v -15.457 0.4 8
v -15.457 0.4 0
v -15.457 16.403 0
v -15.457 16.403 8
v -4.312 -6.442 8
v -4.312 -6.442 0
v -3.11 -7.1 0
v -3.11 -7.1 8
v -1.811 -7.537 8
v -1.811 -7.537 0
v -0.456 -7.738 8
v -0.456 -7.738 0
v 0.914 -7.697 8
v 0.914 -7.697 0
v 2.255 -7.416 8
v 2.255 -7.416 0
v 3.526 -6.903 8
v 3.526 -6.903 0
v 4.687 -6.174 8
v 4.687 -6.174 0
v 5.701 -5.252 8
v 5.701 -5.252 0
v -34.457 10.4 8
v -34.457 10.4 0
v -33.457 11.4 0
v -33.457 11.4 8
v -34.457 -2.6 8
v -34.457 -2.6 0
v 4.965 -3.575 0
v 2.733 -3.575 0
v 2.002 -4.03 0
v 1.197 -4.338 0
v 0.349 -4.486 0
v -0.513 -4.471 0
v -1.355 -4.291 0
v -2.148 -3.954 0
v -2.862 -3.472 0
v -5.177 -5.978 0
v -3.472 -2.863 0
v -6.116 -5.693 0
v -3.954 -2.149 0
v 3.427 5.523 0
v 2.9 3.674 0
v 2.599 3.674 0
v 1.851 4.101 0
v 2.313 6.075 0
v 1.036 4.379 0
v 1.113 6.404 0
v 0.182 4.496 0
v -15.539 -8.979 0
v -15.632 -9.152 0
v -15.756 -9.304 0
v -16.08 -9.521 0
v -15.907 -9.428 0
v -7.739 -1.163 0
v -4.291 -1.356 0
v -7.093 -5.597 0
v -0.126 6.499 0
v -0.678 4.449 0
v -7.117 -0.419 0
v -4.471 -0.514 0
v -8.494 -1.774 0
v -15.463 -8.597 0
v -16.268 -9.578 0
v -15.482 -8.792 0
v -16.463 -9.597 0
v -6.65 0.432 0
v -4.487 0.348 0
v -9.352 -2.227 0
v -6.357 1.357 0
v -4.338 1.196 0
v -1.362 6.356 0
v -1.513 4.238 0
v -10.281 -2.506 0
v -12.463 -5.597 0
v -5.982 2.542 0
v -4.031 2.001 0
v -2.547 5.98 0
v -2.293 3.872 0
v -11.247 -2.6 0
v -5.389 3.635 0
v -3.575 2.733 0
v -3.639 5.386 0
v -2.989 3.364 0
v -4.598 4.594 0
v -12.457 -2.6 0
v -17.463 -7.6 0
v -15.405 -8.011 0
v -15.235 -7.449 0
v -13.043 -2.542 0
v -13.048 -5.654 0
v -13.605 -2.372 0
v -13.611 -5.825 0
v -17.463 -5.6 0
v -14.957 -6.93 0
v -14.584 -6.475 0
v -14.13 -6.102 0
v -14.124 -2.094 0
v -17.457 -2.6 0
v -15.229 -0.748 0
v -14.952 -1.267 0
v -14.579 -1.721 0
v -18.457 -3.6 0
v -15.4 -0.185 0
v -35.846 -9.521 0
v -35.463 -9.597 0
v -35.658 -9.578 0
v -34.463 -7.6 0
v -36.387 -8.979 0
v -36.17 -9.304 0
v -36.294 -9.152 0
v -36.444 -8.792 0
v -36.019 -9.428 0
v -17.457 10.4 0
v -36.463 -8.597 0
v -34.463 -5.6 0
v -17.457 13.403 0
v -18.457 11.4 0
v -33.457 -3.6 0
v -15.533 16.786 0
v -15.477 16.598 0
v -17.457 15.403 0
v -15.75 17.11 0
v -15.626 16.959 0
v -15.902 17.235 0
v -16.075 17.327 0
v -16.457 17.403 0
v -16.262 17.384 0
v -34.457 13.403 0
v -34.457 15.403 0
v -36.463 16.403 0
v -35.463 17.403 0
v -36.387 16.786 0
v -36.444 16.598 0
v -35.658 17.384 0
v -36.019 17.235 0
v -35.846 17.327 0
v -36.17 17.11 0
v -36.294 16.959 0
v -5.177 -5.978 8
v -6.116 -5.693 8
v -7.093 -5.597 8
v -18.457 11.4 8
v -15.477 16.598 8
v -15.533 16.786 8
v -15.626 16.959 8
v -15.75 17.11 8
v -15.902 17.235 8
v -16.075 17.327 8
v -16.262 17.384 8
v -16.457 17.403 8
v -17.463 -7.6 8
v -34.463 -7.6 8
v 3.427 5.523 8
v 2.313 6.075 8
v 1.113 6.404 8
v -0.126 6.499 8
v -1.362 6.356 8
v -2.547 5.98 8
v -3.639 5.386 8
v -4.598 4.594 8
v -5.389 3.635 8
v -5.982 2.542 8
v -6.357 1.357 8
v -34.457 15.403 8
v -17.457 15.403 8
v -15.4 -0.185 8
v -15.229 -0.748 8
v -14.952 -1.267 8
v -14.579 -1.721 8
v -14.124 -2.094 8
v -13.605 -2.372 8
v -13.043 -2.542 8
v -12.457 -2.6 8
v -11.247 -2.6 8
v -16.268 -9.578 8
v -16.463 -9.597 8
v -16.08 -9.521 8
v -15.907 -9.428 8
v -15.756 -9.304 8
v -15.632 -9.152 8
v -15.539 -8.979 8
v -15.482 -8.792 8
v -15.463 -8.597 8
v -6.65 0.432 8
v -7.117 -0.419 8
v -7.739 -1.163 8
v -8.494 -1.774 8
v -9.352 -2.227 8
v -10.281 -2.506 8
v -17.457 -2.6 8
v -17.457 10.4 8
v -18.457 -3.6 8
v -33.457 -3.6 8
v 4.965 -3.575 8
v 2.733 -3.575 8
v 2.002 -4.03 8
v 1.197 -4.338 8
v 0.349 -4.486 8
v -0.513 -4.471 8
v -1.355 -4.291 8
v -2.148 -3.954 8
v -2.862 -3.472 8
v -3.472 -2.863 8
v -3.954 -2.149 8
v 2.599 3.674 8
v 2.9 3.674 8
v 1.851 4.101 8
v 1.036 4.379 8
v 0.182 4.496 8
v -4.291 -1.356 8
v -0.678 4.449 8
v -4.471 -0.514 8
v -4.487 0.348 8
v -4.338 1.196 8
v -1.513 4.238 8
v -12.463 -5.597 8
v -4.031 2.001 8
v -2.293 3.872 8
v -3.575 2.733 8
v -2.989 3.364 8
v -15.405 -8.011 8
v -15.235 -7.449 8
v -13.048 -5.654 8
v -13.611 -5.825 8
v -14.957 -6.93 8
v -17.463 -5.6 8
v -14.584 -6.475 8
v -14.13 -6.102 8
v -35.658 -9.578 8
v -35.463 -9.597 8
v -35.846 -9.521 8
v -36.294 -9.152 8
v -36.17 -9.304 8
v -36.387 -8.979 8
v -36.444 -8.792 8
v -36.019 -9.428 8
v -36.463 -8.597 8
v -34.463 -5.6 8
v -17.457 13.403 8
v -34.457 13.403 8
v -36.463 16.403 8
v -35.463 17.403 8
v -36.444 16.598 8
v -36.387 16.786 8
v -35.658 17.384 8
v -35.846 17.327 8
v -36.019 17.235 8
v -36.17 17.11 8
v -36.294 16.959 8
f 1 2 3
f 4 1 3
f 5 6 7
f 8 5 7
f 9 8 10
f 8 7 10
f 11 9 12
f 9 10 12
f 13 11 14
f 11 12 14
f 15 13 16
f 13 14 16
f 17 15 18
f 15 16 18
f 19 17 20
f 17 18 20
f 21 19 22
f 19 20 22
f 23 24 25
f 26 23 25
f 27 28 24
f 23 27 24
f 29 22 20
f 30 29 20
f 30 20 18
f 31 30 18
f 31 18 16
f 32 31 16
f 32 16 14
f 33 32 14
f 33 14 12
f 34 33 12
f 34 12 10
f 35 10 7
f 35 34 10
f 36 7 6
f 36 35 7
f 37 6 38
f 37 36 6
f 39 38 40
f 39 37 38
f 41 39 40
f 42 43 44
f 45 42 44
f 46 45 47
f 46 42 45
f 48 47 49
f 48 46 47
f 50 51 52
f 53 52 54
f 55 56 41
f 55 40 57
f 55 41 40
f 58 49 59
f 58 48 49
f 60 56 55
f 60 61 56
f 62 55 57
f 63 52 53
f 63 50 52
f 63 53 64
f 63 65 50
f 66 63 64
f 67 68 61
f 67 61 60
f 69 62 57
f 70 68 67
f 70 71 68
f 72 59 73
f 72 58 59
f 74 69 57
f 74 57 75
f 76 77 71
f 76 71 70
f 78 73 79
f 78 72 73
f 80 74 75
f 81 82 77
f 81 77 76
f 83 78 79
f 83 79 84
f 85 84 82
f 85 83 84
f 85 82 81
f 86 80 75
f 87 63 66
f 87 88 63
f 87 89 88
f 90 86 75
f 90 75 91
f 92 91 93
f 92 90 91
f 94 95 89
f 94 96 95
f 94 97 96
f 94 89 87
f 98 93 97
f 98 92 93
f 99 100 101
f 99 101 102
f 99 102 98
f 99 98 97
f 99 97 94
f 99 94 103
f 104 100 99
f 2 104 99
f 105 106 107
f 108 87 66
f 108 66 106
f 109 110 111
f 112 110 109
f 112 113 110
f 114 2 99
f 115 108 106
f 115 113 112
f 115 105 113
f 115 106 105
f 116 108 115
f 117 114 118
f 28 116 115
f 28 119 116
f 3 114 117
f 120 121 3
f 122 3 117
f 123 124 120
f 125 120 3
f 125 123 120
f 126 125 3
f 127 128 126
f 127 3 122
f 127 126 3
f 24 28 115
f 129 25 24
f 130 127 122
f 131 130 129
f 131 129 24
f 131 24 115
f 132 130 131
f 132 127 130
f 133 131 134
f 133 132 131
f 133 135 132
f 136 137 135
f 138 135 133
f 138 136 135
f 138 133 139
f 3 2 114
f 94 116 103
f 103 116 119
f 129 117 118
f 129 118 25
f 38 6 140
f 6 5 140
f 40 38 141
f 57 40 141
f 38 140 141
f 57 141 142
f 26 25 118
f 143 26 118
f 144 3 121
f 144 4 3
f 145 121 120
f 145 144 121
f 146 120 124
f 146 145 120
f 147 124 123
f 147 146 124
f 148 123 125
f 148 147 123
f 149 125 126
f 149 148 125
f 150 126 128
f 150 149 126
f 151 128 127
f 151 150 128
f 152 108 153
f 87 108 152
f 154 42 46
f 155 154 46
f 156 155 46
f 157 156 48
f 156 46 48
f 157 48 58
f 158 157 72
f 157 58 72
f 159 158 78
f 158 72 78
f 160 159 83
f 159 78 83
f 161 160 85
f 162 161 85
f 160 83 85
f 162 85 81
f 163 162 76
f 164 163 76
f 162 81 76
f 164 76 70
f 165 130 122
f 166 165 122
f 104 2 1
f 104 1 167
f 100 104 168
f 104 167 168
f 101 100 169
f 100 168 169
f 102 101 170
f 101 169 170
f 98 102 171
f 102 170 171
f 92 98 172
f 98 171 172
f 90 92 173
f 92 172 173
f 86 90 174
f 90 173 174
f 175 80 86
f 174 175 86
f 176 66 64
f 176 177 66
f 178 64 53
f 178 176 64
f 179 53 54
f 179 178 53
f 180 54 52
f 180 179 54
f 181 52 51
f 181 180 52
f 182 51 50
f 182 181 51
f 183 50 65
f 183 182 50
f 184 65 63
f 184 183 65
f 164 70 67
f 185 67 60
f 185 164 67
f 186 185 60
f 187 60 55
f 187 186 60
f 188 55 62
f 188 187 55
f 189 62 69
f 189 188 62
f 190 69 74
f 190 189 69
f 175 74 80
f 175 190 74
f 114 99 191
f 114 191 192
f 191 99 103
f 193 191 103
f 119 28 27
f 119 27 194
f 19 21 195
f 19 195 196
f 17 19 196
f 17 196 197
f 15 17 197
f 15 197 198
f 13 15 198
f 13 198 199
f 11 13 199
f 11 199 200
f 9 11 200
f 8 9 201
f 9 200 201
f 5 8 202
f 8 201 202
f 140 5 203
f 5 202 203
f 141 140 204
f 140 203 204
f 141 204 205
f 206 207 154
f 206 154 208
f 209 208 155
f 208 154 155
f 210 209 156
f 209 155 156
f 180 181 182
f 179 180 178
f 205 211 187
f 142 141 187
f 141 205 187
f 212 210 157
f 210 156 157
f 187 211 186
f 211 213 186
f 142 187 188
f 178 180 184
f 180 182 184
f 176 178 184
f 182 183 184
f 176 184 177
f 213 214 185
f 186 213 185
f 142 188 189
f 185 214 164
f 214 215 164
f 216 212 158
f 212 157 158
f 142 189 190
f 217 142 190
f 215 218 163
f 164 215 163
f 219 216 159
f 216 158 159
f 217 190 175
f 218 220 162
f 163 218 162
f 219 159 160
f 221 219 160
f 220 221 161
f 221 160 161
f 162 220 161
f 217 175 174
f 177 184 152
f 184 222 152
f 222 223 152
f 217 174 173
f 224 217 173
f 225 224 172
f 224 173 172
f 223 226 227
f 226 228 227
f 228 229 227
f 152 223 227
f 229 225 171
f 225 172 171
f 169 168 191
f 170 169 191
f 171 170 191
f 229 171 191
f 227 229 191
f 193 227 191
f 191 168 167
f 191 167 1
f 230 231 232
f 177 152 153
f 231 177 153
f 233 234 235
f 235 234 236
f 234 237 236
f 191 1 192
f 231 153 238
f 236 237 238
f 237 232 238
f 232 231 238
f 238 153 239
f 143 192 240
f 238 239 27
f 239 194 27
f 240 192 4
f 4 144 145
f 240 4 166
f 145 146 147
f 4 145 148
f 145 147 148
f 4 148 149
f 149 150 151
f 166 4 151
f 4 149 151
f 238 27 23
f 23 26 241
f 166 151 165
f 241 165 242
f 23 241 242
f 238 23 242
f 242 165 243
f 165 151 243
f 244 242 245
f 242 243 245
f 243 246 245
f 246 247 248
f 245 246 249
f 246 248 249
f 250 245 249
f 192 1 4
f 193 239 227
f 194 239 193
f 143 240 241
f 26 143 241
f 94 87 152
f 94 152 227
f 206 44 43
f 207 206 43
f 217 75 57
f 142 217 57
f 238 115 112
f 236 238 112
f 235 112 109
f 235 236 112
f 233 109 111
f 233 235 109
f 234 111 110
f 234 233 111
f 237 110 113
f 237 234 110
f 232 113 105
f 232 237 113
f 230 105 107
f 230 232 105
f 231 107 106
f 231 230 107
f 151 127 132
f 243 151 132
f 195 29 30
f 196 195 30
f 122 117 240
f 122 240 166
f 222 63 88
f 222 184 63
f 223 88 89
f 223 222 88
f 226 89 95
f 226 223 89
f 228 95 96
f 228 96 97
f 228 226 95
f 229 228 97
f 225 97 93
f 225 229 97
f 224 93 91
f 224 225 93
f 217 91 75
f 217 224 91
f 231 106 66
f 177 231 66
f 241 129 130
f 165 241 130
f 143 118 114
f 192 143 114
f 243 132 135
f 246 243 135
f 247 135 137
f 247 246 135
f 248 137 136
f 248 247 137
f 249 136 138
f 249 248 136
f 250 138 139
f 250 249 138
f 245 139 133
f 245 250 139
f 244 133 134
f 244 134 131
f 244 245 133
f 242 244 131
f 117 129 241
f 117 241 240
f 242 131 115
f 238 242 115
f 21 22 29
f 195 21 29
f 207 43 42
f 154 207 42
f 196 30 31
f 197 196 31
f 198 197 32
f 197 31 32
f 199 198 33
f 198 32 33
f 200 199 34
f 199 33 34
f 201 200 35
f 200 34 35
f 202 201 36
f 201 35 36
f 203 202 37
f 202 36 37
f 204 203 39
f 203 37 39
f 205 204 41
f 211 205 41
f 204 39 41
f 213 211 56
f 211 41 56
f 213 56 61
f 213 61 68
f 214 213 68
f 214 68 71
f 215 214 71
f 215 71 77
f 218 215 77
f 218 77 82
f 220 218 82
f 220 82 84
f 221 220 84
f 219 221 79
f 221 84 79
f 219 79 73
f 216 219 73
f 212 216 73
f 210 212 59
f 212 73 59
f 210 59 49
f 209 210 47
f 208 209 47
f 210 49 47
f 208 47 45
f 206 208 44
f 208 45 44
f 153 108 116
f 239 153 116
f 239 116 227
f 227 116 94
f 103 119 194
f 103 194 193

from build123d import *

# Parameters (mm, degrees)
F0_W        = 17
F0_H        = 2
F0_H_2      = 15
F1_DEPTH    = 8
F2_R        = 5
F3_T1_DEPTH = 8
F3_T3_DEPTH = 18.3525106995
F3_T5_DEPTH = 21.4805273161
F4_R        = 1
F5_R        = 2.99999


# Not quite as in the source:
# - a fillet or chamfer that OpenCascade refuses, or shapes differently, is made with other operations: its cross-section is extruded or revolved along the edge and cut away or added
# - a fillet or chamfer is up to 0.001 mm smaller than in the source, because OpenCascade refuses the exact size


with BuildPart() as f1:
    # F0 (on Top) → F1 (new body)
    with BuildSketch(Plane.XY):
        with BuildLine():
            ThreePointArc((2.7332443879, -3.5748251868), (-4.4992296638, -0.0832612306), (2.5991092476, 3.6735039294))
            Line((2.5991092476, 3.6735039294), (5.3624032747, 3.6735039294))
            ThreePointArc((5.3624032747, 3.6735039294), (-3.1508257353, 5.6852701946), (-5.9573484034, -2.6))
            Line((-5.9573484034, -2.6), (-15.4573484034, -2.6))
            Line((-15.4573484034, -2.6), (-15.4573484034, 13.4))
            Line((-15.4573484034, 13.4), (-15.4573484034, 17.4032363431))
            Line((-15.4573484034, 17.4032363431), (-36.4629774356, 17.4032363431))
            Line((-36.4629774356, 17.4032363431), (-36.4629774356, 11.4032363431))
            Line((-36.4629774356, 11.4032363431), (-36.4629774356, -9.5967636569))
            Line((-36.4629774356, -9.5967636569), (-15.4629774356, -9.5967636569))
            Line((-15.4629774356, -9.5967636569), (-15.4629774356, -5.5967636569))
            Line((-15.4629774356, -5.5967636569), (-5.3631004506, -5.5967636569))
            ThreePointArc((-5.3631004506, -5.5967636569), (1.2632530504, -7.6479279289), (6.8780254985, -3.5748251868))
            Line((6.8780254985, -3.5748251868), (2.7332443879, -3.5748251868))
        make_face()
        with Locations((-25.9629774356, -6.6)):
            Rectangle(F0_W, F0_H, mode=Mode.SUBTRACT)
        with Locations((-25.9573484034, 3.9)):
            Rectangle(F0_W, F0_H_2, mode=Mode.SUBTRACT)
        with Locations((-25.9573484034, 14.4032363431)):
            Rectangle(F0_W, F0_H, mode=Mode.SUBTRACT)
    extrude(amount=F1_DEPTH)

    # F2
    f2_edges = [f1.edges().sort_by_distance(p)[0] for p in [
        (-5.957348, -2.6, 4),
        (-5.3631, -5.596764, 4),
    ]]
    fillet(f2_edges, radius=F2_R)

    # F3: chamfer of 1 on 6 edges, made by hand

    # F3_s2 → F3_t1 (join)
    with BuildSketch(Plane.XY):
        Polygon((-34.4573484034, -2.6), (-33.4573484034, -3.6), (-34.4573484034, -3.6), align=None)
        Polygon((-34.4573484034, 10.4), (-33.4573484034, 11.4), (-34.4573484034, 11.4), align=None)
        Polygon((-18.4573484034, 11.4), (-17.4573484034, 10.4), (-17.4573484034, 11.4), align=None)
        Polygon((-17.4573484034, -2.6), (-18.4573484034, -3.6), (-17.4573484034, -3.6), align=None)
    extrude(amount=F3_T1_DEPTH)

    # F3_s4 → F3_t3 (cut)
    with BuildSketch(Plane.XY.offset(-5.1762553498)):
        with BuildLine():
            Line((5.7007617196, -5.2524209363), (4.9653271539, -3.5748251868))
            Line((4.9653271539, -3.5748251868), (6.8780254985, -3.5748251868))
            ThreePointArc((6.8780254985, -3.5748251868), (6.3390727508, -4.4612516781), (5.7007617196, -5.2524209363))
        make_face()
    extrude(amount=F3_T3_DEPTH, mode=Mode.SUBTRACT)

    # F3_s6 → F3_t5 (cut)
    with BuildSketch(Plane.XY.offset(-6.740263658)):
        with BuildLine():
            Line((2.8997174039, 3.6735039294), (3.42693875, 5.5232319165))
            ThreePointArc((3.42693875, 5.5232319165), (4.4840607821, 4.7056560544), (5.3624032747, 3.6735039294))
            Line((5.3624032747, 3.6735039294), (2.8997174039, 3.6735039294))
        make_face()
    extrude(amount=F3_T5_DEPTH, mode=Mode.SUBTRACT)

    # F4
    f4_edges = [f1.edges().sort_by_distance(p)[0] for p in [
        (-15.462977, -9.596764, 4),
        (-36.462977, 17.403236, 4),
        (-15.457348, 17.403236, 4),
        (-36.462977, -9.596764, 4),
    ]]
    fillet(f4_edges, radius=F4_R)

    # F5 (radius 3 in the source; OpenCascade refuses exactly that, so slightly less here)
    f5_edges = [f1.edges().sort_by_distance(p)[0] for p in [
        (-15.457348, -2.6, 4),
        (-15.462977, -5.596764, 4),
    ]]
    fillet(f5_edges, radius=F5_R)


solid = f1.part
